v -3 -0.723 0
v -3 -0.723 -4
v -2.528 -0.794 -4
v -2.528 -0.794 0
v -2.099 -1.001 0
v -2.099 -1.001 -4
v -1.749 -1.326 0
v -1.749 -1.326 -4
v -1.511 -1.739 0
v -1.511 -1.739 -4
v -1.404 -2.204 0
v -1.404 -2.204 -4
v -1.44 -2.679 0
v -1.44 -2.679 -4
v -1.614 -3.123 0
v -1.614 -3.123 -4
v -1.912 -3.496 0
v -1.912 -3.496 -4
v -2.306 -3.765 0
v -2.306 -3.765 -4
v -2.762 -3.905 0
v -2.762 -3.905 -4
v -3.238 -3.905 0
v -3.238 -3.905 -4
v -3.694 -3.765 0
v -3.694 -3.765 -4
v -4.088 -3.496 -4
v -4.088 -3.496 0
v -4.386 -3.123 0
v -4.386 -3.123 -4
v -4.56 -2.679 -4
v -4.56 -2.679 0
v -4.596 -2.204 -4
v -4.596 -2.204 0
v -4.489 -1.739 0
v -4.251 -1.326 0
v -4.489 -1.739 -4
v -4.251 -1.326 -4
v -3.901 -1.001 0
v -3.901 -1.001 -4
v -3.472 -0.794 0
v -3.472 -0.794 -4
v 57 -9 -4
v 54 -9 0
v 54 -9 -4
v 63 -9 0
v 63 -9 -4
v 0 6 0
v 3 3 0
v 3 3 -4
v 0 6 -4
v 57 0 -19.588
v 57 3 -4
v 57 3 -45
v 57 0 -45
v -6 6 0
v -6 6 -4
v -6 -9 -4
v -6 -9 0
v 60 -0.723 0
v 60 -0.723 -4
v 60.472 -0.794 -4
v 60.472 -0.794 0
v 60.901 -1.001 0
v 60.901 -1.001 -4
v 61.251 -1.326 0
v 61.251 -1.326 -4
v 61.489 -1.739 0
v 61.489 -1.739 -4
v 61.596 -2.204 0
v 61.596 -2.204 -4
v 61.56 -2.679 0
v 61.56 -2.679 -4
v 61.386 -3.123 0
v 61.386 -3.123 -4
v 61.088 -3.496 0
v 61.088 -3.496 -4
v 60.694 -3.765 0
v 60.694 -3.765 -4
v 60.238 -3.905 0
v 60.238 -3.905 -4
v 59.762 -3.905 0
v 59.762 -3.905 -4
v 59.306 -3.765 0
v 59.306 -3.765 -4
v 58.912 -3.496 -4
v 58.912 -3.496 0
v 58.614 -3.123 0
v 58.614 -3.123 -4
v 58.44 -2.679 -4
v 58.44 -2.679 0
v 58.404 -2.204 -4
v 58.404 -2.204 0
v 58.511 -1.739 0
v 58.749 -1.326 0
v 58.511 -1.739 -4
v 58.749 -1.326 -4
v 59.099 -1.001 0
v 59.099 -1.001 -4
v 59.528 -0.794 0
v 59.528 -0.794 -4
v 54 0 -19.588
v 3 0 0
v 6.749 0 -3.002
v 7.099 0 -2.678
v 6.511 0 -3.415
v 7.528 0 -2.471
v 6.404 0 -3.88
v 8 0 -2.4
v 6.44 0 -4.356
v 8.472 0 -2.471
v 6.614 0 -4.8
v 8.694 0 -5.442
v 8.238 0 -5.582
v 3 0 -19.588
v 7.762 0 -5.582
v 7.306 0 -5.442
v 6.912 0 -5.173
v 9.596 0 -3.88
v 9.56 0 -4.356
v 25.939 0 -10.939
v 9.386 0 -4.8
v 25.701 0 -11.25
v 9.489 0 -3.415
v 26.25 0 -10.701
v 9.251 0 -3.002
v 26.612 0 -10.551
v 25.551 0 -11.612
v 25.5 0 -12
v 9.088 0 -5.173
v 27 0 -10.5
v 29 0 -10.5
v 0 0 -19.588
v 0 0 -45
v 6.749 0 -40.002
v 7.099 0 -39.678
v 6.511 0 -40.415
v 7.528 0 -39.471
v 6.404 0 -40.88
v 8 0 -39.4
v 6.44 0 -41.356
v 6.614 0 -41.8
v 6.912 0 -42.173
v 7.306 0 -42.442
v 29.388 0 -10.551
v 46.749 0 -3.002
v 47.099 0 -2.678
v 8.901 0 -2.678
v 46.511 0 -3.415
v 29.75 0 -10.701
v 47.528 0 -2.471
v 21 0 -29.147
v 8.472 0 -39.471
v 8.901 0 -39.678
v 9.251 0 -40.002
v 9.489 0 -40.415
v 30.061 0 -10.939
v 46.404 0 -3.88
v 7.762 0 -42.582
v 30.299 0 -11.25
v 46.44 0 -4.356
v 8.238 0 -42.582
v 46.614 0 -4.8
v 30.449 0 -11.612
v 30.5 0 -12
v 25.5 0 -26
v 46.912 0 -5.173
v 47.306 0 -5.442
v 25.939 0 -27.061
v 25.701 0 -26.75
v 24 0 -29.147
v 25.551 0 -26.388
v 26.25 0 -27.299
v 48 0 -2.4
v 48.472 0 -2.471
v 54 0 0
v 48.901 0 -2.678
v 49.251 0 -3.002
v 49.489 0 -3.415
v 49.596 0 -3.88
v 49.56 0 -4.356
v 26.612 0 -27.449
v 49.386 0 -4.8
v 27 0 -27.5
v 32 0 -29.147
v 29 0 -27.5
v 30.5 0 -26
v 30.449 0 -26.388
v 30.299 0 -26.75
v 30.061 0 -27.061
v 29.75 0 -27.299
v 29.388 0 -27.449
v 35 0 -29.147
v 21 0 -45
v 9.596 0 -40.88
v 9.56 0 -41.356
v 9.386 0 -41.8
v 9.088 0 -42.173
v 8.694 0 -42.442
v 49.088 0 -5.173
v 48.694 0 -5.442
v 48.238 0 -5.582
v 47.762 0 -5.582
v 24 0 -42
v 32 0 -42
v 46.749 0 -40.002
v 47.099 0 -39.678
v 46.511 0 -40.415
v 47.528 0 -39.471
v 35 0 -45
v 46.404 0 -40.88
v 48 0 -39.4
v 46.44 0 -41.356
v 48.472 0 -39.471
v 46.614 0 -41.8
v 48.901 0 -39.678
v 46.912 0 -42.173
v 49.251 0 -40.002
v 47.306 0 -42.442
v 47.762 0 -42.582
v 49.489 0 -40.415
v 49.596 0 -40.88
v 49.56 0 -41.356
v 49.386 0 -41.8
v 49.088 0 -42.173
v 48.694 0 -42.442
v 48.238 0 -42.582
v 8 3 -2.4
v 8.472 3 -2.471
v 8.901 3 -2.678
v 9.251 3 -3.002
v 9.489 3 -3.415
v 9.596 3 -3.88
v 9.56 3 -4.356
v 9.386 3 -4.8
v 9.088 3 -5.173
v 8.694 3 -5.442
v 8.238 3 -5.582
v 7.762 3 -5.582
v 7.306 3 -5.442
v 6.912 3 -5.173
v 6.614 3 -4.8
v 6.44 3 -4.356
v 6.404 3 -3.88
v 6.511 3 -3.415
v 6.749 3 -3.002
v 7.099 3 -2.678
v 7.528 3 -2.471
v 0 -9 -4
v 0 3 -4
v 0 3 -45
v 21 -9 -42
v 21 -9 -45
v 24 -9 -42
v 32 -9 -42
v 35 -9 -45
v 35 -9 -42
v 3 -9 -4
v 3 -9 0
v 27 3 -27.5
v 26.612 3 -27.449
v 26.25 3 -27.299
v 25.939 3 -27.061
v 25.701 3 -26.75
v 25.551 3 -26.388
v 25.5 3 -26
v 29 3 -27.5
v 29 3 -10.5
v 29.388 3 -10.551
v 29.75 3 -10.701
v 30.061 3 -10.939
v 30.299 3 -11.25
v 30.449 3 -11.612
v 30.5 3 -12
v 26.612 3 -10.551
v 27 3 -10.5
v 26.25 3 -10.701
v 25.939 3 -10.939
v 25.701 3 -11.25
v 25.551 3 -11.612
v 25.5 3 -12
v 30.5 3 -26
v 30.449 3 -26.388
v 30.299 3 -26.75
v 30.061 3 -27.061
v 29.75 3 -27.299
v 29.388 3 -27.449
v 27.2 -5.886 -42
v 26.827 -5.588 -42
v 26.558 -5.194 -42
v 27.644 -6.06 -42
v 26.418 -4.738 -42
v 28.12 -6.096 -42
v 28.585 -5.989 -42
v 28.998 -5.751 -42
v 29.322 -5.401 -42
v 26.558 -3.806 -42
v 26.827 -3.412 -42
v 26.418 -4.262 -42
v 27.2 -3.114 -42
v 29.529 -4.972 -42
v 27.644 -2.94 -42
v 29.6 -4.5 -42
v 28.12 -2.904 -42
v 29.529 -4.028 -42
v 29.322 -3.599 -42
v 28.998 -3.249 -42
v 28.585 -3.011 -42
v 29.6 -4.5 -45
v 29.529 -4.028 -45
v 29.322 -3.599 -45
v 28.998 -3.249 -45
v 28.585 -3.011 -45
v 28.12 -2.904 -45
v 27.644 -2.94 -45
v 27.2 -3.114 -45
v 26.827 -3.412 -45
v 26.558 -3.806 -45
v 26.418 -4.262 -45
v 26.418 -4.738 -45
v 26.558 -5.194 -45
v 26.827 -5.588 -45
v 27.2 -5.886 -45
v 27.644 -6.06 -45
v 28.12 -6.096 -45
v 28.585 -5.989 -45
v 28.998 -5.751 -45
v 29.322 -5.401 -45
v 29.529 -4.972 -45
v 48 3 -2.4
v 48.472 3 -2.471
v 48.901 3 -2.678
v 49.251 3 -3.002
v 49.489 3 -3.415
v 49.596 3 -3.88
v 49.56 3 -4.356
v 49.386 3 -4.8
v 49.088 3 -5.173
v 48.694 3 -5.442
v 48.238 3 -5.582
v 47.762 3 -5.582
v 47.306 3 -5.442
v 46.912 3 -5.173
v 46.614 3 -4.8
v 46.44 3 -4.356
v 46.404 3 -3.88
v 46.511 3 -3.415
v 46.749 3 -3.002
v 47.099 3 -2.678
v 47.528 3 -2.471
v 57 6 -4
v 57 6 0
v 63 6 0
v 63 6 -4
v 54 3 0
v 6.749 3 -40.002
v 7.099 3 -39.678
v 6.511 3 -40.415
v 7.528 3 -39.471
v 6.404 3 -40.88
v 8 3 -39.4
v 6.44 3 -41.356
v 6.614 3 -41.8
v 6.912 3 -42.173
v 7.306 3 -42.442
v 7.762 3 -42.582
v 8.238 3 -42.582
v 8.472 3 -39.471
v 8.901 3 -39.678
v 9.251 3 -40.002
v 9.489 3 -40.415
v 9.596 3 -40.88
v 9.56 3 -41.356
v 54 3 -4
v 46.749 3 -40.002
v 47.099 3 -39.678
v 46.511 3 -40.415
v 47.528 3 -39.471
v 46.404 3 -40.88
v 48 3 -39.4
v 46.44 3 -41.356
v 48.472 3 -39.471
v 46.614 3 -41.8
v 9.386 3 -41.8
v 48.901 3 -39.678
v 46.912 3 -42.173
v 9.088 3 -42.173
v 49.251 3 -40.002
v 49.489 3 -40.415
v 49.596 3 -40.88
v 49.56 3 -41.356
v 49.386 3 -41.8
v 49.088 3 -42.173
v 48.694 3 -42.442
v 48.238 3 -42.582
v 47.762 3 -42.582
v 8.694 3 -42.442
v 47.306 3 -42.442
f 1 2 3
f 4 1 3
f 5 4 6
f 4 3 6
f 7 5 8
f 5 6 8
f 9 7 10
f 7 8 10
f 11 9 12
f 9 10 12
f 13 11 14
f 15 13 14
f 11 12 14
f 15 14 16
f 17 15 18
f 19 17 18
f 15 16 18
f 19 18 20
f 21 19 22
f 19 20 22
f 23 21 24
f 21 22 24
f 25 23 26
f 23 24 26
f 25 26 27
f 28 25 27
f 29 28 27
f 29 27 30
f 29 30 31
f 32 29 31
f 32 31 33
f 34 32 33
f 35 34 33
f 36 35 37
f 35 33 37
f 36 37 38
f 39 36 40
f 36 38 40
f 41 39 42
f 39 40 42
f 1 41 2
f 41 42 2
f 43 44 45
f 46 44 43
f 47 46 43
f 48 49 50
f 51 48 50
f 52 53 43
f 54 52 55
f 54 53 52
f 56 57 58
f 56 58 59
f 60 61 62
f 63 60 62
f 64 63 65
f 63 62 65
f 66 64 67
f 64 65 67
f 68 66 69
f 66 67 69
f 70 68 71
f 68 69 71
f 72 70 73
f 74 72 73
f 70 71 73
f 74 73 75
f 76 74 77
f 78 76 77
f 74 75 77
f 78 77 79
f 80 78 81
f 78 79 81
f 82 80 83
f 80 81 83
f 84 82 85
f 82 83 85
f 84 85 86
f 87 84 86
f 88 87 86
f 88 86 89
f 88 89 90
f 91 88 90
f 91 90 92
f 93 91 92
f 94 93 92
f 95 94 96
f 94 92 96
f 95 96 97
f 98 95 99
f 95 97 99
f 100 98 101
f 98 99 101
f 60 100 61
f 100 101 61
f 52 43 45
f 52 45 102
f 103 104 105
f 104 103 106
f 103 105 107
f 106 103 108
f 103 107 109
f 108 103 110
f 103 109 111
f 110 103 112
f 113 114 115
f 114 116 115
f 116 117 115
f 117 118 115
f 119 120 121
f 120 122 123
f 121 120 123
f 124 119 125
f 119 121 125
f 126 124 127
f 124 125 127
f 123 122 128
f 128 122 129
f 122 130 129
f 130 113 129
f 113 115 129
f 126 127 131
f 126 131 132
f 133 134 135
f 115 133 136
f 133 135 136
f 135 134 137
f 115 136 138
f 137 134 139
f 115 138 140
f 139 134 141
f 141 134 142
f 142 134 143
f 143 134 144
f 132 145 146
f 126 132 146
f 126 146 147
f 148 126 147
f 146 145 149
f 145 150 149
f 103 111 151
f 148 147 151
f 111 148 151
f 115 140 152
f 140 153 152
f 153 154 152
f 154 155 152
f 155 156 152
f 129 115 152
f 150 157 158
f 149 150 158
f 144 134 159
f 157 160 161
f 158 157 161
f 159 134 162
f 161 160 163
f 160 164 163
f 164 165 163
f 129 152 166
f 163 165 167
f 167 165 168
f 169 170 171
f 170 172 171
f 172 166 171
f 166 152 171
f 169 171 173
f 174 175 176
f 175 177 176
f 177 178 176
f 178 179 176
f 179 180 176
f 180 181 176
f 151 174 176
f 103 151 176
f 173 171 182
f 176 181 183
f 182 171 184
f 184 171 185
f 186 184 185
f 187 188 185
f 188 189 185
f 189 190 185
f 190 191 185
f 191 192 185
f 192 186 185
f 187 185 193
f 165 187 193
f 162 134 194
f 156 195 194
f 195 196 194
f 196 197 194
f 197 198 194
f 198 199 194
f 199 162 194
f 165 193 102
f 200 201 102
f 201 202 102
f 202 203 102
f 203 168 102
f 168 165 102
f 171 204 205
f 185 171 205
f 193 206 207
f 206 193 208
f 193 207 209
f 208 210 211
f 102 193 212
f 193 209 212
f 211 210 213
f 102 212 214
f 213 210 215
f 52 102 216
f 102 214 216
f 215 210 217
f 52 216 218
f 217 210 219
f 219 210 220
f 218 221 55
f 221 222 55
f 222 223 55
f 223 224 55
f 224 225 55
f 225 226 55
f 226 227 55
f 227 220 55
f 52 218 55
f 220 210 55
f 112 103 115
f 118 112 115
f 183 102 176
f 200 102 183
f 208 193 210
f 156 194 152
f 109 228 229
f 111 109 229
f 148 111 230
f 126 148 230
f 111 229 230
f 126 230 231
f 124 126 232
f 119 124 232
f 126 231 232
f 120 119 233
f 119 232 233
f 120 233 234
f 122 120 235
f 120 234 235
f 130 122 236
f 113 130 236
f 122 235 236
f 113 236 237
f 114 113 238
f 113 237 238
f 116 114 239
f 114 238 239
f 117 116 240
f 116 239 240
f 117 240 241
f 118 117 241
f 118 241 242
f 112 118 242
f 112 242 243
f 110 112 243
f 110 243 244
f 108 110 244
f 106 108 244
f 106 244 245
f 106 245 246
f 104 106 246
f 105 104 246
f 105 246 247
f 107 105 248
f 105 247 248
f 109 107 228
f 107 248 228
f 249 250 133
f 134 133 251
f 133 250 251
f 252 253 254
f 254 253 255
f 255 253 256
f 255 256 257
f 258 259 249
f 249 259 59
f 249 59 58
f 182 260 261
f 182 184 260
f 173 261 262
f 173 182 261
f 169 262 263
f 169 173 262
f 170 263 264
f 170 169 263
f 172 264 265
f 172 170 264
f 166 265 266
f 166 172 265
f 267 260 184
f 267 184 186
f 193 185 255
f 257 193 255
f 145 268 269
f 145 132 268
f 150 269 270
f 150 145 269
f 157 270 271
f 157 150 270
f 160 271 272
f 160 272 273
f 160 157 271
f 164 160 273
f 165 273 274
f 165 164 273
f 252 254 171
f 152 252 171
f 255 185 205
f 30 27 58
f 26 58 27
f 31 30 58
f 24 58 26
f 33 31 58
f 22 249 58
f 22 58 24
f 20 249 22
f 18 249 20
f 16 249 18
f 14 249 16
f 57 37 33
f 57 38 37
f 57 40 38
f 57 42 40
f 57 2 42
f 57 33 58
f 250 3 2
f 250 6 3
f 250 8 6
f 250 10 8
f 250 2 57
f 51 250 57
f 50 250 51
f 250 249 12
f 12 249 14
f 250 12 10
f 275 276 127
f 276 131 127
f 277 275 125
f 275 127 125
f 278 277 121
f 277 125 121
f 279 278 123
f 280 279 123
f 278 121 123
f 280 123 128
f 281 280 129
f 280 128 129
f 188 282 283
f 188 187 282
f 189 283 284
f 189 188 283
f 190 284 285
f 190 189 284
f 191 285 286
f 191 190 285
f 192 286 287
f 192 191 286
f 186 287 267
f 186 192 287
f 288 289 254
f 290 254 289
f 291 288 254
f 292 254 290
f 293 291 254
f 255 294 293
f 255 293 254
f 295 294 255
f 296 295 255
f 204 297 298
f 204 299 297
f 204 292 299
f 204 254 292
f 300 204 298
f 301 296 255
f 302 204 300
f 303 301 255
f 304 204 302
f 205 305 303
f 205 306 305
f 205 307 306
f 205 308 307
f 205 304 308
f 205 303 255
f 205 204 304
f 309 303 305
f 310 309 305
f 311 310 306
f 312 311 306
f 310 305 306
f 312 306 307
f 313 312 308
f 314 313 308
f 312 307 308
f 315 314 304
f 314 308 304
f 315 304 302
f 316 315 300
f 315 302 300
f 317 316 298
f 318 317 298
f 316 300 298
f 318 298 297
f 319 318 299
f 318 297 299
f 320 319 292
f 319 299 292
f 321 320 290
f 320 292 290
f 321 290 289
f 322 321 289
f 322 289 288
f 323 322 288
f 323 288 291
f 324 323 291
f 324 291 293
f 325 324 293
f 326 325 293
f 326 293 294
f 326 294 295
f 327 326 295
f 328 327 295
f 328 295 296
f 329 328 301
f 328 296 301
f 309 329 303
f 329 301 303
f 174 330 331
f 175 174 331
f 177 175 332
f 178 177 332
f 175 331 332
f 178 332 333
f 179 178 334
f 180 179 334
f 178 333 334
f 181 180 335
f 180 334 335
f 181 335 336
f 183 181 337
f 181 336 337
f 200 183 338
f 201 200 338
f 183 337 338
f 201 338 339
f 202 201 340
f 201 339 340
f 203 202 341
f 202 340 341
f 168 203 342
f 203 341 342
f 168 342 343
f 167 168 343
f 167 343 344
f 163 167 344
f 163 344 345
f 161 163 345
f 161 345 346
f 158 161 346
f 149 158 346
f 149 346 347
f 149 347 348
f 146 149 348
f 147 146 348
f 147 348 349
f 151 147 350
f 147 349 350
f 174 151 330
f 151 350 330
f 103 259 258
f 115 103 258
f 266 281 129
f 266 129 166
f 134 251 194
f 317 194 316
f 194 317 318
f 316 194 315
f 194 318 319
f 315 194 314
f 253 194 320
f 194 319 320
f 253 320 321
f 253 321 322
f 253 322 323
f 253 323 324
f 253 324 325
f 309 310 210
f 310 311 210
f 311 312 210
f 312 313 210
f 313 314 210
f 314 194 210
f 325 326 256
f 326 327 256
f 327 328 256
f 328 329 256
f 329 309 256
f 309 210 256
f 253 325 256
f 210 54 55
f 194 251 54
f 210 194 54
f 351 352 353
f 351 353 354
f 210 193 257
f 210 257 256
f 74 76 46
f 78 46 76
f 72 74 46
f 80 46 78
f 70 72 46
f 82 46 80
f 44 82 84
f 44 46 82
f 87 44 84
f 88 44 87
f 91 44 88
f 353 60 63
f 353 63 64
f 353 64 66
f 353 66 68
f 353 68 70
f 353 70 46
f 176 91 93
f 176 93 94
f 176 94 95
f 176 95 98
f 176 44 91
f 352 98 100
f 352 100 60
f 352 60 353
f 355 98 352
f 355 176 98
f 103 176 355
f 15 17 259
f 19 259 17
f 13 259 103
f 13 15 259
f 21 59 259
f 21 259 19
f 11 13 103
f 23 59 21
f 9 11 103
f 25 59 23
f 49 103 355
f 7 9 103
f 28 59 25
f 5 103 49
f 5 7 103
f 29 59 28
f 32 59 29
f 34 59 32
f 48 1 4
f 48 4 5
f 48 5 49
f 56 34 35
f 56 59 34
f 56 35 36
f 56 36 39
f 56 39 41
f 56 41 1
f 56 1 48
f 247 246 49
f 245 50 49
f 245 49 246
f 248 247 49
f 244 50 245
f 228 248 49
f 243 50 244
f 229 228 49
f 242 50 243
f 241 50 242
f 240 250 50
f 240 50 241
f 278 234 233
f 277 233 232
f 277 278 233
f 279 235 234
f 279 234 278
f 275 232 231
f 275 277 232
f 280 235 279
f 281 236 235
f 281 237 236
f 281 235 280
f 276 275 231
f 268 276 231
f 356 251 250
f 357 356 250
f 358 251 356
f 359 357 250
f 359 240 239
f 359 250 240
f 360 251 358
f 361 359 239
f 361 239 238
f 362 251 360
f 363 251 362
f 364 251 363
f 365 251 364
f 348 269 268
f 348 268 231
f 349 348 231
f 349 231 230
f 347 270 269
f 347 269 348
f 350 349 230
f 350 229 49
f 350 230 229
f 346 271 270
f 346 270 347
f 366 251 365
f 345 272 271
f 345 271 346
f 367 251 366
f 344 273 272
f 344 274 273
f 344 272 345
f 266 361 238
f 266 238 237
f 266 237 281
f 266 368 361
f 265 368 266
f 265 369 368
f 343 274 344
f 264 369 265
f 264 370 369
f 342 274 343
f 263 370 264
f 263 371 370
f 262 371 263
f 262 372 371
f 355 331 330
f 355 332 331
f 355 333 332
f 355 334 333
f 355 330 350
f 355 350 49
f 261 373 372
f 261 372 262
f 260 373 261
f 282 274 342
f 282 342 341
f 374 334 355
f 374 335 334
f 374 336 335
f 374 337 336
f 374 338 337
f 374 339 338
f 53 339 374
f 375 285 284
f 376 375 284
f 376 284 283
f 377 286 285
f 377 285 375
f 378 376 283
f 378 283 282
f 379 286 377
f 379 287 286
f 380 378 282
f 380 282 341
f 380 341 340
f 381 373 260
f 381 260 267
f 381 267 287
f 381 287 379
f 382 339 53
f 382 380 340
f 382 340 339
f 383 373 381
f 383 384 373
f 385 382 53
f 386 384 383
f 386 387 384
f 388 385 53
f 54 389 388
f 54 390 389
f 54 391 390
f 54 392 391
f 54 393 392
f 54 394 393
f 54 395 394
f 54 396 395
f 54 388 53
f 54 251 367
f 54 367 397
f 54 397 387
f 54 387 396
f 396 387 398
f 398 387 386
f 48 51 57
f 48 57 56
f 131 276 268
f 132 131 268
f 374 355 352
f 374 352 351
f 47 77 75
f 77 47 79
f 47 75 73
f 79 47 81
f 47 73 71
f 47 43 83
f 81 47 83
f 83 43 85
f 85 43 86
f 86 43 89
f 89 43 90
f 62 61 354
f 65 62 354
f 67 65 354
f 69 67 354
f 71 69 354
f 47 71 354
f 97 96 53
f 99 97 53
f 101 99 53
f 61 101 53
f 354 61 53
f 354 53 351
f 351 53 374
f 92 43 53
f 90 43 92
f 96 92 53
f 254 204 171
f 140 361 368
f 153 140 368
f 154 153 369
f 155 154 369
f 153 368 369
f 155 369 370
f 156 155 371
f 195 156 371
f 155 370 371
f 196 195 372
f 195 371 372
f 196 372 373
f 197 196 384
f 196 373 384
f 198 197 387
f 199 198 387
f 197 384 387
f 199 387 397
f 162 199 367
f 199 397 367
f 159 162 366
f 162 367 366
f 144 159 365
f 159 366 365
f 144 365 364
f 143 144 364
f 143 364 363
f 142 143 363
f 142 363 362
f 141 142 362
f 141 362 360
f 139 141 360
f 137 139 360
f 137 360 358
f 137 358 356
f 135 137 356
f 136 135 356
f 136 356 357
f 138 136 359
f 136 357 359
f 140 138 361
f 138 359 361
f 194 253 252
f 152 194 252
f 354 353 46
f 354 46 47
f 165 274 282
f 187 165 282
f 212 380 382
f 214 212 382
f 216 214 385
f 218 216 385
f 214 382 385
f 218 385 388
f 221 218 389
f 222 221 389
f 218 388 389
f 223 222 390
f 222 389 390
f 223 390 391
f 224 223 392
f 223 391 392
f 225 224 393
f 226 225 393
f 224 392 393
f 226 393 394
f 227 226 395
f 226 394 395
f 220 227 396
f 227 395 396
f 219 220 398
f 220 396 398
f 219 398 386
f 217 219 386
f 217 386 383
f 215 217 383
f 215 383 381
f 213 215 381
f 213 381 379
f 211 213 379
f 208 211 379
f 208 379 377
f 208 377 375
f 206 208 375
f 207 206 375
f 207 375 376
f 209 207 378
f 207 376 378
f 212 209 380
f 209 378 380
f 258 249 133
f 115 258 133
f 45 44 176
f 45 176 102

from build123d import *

# Parameters (mm, degrees)
SKETCH_1_W          = 57
SKETCH_1_H          = 45
EXTRUDE_1_DEPTH     = 3
SKETCH_2_W          = 4
SKETCH_2_H          = 15
EXTRUDE_2_DEPTH     = 6
SKETCH_3_W          = 4
SKETCH_3_H          = 15
EXTRUDE_3_DEPTH     = 6
EXTRUDE_4_DEPTH     = 3
SKETCH_5_W          = 4
SKETCH_5_H          = 9
EXTRUDE_5_DEPTH     = 3
CHAMFER_1_SIZE      = 3
SKETCH_6_R          = 1.6
CUT_EXTRUDE_1_DEPTH = 4
SKETCH_7_R          = 1.6
CUT_EXTRUDE_2_DEPTH = 3
SKETCH_8_W          = 8
SKETCH_8_H          = 3
EXTRUDE_6_DEPTH     = 9
EXTRUDE_7_DEPTH     = 3
EXTRUDE_8_DEPTH     = 3
SKETCH_11_R         = 1.6
CUT_EXTRUDE_3_DEPTH = 3
SKETCH_12_W         = 5
SKETCH_12_H         = 17
CUT_EXTRUDE_4_DEPTH = 3
FILLET_1_R          = 1.5


with BuildPart() as part:
    # 草图1 → 凸台-拉伸1 (new body)
    with BuildSketch(Plane(origin=(0, 0, 0), x_dir=(1, 0, 0), z_dir=(0, 1, 0))):
        with Locations((28.5, 22.5)):
            Rectangle(SKETCH_1_W, SKETCH_1_H)
    extrude(amount=EXTRUDE_1_DEPTH)

    # 草图2 → 凸台-拉伸2 (add)
    with BuildSketch(Plane.ZY):
        with Locations((-2, -1.5)):
            Rectangle(SKETCH_2_W, SKETCH_2_H)
    extrude(amount=EXTRUDE_2_DEPTH)

    # 草图3 → 凸台-拉伸3 (add)
    with BuildSketch(Plane(origin=(57, 0, 0), x_dir=(0, 0, -1), z_dir=(1, 0, 0))):
        with Locations((2, -1.5)):
            Rectangle(SKETCH_3_W, SKETCH_3_H)
    extrude(amount=EXTRUDE_3_DEPTH)

    # 草图4 → 凸台-拉伸4 (add)
    with BuildSketch(Plane.ZY.offset(-57)):
        Polygon((-4, -9), (-19.588457268, 0), (0, 0), (0, -9), align=None)
    extrude(amount=EXTRUDE_4_DEPTH)

    # 草图5 → 凸台-拉伸5 (add)
    with BuildSketch(Plane(origin=(0, 0, 0), x_dir=(0, 0, -1), z_dir=(1, 0, 0))):
        Polygon((19.588457268, 0), (4, 0), (4, -9), align=None)
        with Locations((2, -4.5)):
            Rectangle(SKETCH_5_W, SKETCH_5_H)
    extrude(amount=EXTRUDE_5_DEPTH)

    # 倒角1
    chamfer_1_edges = [part.edges().sort_by_distance(p)[0] for p in [
        (0, 3, -2),
        (57, 3, -2),
    ]]
    chamfer(chamfer_1_edges, length=CHAMFER_1_SIZE - 0.0001)  # a hair under: the kernel refuses the full size

    # 草图6 → 切除-拉伸1 (cut)
    with BuildSketch(Plane(origin=(0, 0, -4), x_dir=(-1, 0, 0), z_dir=(0, 0, -1))):
        with Locations(Location((3, -2.323268139, 0), (0, 0, 90))):
            Circle(SKETCH_6_R)
        with Locations(Location((-60, -2.323268139, 0), (0, 0, 90))):
            Circle(SKETCH_6_R)
    extrude(amount=-CUT_EXTRUDE_1_DEPTH, mode=Mode.SUBTRACT)

    # 草图7 → 切除-拉伸2 (cut)
    with BuildSketch(Plane(origin=(0, 3, 0), x_dir=(1, 0, 0), z_dir=(0, 1, 0))):
        with Locations(Location((8, 41, 0), (0, 0, 270))):
            Circle(SKETCH_7_R)
        with Locations(Location((8, 4, 0), (0, 0, 270))):
            Circle(SKETCH_7_R)
        with Locations(Location((48, 4, 0), (0, 0, 270))):
            Circle(SKETCH_7_R)
        with Locations(Location((48, 41, 0), (0, 0, 270))):
            Circle(SKETCH_7_R)
    extrude(amount=-CUT_EXTRUDE_2_DEPTH, mode=Mode.SUBTRACT)

    # 草图8 → 凸台-拉伸6 (add)
    with BuildSketch(Plane.XZ):
        with Locations((28, -43.5)):
            Rectangle(SKETCH_8_W, SKETCH_8_H)
    extrude(amount=EXTRUDE_6_DEPTH)

    # 草图9 → 凸台-拉伸7 (add)
    with BuildSketch(Plane(origin=(32, 0, 0), x_dir=(0, 0, -1), z_dir=(1, 0, 0))):
        Polygon((45, 0), (29.146667939, 0), (42, -9), (45, -9), align=None)
    extrude(amount=EXTRUDE_7_DEPTH)

    # 草图10 → 凸台-拉伸8 (add)
    with BuildSketch(Plane.ZY.offset(-24)):
        Polygon((-45, 0), (-45, -9), (-42, -9), (-29.146667939, 0), align=None)
    extrude(amount=EXTRUDE_8_DEPTH)

    # 草图11 → 切除-拉伸3 (cut)
    with BuildSketch(Plane.XY.offset(-42)):
        with Locations((28, -4.5)):
            Circle(SKETCH_11_R)
    extrude(amount=-CUT_EXTRUDE_3_DEPTH, mode=Mode.SUBTRACT)

    # 草图12 → 切除-拉伸4 (cut)
    with BuildSketch(Plane(origin=(0, 3, 0), x_dir=(1, 0, 0), z_dir=(0, 1, 0))):
        with Locations((28, 19)):
            Rectangle(SKETCH_12_W, SKETCH_12_H)
    extrude(amount=-CUT_EXTRUDE_4_DEPTH, mode=Mode.SUBTRACT)

    # 圆角1
    fillet_1_edges = [part.edges().sort_by_distance(p)[0] for p in [
        (25.5, 1.5, -27.5),
        (30.5, 1.5, -27.5),
        (30.5, 1.5, -10.5),
        (25.5, 1.5, -10.5),
    ]]
    fillet(fillet_1_edges, radius=FILLET_1_R)


solid = part.part
